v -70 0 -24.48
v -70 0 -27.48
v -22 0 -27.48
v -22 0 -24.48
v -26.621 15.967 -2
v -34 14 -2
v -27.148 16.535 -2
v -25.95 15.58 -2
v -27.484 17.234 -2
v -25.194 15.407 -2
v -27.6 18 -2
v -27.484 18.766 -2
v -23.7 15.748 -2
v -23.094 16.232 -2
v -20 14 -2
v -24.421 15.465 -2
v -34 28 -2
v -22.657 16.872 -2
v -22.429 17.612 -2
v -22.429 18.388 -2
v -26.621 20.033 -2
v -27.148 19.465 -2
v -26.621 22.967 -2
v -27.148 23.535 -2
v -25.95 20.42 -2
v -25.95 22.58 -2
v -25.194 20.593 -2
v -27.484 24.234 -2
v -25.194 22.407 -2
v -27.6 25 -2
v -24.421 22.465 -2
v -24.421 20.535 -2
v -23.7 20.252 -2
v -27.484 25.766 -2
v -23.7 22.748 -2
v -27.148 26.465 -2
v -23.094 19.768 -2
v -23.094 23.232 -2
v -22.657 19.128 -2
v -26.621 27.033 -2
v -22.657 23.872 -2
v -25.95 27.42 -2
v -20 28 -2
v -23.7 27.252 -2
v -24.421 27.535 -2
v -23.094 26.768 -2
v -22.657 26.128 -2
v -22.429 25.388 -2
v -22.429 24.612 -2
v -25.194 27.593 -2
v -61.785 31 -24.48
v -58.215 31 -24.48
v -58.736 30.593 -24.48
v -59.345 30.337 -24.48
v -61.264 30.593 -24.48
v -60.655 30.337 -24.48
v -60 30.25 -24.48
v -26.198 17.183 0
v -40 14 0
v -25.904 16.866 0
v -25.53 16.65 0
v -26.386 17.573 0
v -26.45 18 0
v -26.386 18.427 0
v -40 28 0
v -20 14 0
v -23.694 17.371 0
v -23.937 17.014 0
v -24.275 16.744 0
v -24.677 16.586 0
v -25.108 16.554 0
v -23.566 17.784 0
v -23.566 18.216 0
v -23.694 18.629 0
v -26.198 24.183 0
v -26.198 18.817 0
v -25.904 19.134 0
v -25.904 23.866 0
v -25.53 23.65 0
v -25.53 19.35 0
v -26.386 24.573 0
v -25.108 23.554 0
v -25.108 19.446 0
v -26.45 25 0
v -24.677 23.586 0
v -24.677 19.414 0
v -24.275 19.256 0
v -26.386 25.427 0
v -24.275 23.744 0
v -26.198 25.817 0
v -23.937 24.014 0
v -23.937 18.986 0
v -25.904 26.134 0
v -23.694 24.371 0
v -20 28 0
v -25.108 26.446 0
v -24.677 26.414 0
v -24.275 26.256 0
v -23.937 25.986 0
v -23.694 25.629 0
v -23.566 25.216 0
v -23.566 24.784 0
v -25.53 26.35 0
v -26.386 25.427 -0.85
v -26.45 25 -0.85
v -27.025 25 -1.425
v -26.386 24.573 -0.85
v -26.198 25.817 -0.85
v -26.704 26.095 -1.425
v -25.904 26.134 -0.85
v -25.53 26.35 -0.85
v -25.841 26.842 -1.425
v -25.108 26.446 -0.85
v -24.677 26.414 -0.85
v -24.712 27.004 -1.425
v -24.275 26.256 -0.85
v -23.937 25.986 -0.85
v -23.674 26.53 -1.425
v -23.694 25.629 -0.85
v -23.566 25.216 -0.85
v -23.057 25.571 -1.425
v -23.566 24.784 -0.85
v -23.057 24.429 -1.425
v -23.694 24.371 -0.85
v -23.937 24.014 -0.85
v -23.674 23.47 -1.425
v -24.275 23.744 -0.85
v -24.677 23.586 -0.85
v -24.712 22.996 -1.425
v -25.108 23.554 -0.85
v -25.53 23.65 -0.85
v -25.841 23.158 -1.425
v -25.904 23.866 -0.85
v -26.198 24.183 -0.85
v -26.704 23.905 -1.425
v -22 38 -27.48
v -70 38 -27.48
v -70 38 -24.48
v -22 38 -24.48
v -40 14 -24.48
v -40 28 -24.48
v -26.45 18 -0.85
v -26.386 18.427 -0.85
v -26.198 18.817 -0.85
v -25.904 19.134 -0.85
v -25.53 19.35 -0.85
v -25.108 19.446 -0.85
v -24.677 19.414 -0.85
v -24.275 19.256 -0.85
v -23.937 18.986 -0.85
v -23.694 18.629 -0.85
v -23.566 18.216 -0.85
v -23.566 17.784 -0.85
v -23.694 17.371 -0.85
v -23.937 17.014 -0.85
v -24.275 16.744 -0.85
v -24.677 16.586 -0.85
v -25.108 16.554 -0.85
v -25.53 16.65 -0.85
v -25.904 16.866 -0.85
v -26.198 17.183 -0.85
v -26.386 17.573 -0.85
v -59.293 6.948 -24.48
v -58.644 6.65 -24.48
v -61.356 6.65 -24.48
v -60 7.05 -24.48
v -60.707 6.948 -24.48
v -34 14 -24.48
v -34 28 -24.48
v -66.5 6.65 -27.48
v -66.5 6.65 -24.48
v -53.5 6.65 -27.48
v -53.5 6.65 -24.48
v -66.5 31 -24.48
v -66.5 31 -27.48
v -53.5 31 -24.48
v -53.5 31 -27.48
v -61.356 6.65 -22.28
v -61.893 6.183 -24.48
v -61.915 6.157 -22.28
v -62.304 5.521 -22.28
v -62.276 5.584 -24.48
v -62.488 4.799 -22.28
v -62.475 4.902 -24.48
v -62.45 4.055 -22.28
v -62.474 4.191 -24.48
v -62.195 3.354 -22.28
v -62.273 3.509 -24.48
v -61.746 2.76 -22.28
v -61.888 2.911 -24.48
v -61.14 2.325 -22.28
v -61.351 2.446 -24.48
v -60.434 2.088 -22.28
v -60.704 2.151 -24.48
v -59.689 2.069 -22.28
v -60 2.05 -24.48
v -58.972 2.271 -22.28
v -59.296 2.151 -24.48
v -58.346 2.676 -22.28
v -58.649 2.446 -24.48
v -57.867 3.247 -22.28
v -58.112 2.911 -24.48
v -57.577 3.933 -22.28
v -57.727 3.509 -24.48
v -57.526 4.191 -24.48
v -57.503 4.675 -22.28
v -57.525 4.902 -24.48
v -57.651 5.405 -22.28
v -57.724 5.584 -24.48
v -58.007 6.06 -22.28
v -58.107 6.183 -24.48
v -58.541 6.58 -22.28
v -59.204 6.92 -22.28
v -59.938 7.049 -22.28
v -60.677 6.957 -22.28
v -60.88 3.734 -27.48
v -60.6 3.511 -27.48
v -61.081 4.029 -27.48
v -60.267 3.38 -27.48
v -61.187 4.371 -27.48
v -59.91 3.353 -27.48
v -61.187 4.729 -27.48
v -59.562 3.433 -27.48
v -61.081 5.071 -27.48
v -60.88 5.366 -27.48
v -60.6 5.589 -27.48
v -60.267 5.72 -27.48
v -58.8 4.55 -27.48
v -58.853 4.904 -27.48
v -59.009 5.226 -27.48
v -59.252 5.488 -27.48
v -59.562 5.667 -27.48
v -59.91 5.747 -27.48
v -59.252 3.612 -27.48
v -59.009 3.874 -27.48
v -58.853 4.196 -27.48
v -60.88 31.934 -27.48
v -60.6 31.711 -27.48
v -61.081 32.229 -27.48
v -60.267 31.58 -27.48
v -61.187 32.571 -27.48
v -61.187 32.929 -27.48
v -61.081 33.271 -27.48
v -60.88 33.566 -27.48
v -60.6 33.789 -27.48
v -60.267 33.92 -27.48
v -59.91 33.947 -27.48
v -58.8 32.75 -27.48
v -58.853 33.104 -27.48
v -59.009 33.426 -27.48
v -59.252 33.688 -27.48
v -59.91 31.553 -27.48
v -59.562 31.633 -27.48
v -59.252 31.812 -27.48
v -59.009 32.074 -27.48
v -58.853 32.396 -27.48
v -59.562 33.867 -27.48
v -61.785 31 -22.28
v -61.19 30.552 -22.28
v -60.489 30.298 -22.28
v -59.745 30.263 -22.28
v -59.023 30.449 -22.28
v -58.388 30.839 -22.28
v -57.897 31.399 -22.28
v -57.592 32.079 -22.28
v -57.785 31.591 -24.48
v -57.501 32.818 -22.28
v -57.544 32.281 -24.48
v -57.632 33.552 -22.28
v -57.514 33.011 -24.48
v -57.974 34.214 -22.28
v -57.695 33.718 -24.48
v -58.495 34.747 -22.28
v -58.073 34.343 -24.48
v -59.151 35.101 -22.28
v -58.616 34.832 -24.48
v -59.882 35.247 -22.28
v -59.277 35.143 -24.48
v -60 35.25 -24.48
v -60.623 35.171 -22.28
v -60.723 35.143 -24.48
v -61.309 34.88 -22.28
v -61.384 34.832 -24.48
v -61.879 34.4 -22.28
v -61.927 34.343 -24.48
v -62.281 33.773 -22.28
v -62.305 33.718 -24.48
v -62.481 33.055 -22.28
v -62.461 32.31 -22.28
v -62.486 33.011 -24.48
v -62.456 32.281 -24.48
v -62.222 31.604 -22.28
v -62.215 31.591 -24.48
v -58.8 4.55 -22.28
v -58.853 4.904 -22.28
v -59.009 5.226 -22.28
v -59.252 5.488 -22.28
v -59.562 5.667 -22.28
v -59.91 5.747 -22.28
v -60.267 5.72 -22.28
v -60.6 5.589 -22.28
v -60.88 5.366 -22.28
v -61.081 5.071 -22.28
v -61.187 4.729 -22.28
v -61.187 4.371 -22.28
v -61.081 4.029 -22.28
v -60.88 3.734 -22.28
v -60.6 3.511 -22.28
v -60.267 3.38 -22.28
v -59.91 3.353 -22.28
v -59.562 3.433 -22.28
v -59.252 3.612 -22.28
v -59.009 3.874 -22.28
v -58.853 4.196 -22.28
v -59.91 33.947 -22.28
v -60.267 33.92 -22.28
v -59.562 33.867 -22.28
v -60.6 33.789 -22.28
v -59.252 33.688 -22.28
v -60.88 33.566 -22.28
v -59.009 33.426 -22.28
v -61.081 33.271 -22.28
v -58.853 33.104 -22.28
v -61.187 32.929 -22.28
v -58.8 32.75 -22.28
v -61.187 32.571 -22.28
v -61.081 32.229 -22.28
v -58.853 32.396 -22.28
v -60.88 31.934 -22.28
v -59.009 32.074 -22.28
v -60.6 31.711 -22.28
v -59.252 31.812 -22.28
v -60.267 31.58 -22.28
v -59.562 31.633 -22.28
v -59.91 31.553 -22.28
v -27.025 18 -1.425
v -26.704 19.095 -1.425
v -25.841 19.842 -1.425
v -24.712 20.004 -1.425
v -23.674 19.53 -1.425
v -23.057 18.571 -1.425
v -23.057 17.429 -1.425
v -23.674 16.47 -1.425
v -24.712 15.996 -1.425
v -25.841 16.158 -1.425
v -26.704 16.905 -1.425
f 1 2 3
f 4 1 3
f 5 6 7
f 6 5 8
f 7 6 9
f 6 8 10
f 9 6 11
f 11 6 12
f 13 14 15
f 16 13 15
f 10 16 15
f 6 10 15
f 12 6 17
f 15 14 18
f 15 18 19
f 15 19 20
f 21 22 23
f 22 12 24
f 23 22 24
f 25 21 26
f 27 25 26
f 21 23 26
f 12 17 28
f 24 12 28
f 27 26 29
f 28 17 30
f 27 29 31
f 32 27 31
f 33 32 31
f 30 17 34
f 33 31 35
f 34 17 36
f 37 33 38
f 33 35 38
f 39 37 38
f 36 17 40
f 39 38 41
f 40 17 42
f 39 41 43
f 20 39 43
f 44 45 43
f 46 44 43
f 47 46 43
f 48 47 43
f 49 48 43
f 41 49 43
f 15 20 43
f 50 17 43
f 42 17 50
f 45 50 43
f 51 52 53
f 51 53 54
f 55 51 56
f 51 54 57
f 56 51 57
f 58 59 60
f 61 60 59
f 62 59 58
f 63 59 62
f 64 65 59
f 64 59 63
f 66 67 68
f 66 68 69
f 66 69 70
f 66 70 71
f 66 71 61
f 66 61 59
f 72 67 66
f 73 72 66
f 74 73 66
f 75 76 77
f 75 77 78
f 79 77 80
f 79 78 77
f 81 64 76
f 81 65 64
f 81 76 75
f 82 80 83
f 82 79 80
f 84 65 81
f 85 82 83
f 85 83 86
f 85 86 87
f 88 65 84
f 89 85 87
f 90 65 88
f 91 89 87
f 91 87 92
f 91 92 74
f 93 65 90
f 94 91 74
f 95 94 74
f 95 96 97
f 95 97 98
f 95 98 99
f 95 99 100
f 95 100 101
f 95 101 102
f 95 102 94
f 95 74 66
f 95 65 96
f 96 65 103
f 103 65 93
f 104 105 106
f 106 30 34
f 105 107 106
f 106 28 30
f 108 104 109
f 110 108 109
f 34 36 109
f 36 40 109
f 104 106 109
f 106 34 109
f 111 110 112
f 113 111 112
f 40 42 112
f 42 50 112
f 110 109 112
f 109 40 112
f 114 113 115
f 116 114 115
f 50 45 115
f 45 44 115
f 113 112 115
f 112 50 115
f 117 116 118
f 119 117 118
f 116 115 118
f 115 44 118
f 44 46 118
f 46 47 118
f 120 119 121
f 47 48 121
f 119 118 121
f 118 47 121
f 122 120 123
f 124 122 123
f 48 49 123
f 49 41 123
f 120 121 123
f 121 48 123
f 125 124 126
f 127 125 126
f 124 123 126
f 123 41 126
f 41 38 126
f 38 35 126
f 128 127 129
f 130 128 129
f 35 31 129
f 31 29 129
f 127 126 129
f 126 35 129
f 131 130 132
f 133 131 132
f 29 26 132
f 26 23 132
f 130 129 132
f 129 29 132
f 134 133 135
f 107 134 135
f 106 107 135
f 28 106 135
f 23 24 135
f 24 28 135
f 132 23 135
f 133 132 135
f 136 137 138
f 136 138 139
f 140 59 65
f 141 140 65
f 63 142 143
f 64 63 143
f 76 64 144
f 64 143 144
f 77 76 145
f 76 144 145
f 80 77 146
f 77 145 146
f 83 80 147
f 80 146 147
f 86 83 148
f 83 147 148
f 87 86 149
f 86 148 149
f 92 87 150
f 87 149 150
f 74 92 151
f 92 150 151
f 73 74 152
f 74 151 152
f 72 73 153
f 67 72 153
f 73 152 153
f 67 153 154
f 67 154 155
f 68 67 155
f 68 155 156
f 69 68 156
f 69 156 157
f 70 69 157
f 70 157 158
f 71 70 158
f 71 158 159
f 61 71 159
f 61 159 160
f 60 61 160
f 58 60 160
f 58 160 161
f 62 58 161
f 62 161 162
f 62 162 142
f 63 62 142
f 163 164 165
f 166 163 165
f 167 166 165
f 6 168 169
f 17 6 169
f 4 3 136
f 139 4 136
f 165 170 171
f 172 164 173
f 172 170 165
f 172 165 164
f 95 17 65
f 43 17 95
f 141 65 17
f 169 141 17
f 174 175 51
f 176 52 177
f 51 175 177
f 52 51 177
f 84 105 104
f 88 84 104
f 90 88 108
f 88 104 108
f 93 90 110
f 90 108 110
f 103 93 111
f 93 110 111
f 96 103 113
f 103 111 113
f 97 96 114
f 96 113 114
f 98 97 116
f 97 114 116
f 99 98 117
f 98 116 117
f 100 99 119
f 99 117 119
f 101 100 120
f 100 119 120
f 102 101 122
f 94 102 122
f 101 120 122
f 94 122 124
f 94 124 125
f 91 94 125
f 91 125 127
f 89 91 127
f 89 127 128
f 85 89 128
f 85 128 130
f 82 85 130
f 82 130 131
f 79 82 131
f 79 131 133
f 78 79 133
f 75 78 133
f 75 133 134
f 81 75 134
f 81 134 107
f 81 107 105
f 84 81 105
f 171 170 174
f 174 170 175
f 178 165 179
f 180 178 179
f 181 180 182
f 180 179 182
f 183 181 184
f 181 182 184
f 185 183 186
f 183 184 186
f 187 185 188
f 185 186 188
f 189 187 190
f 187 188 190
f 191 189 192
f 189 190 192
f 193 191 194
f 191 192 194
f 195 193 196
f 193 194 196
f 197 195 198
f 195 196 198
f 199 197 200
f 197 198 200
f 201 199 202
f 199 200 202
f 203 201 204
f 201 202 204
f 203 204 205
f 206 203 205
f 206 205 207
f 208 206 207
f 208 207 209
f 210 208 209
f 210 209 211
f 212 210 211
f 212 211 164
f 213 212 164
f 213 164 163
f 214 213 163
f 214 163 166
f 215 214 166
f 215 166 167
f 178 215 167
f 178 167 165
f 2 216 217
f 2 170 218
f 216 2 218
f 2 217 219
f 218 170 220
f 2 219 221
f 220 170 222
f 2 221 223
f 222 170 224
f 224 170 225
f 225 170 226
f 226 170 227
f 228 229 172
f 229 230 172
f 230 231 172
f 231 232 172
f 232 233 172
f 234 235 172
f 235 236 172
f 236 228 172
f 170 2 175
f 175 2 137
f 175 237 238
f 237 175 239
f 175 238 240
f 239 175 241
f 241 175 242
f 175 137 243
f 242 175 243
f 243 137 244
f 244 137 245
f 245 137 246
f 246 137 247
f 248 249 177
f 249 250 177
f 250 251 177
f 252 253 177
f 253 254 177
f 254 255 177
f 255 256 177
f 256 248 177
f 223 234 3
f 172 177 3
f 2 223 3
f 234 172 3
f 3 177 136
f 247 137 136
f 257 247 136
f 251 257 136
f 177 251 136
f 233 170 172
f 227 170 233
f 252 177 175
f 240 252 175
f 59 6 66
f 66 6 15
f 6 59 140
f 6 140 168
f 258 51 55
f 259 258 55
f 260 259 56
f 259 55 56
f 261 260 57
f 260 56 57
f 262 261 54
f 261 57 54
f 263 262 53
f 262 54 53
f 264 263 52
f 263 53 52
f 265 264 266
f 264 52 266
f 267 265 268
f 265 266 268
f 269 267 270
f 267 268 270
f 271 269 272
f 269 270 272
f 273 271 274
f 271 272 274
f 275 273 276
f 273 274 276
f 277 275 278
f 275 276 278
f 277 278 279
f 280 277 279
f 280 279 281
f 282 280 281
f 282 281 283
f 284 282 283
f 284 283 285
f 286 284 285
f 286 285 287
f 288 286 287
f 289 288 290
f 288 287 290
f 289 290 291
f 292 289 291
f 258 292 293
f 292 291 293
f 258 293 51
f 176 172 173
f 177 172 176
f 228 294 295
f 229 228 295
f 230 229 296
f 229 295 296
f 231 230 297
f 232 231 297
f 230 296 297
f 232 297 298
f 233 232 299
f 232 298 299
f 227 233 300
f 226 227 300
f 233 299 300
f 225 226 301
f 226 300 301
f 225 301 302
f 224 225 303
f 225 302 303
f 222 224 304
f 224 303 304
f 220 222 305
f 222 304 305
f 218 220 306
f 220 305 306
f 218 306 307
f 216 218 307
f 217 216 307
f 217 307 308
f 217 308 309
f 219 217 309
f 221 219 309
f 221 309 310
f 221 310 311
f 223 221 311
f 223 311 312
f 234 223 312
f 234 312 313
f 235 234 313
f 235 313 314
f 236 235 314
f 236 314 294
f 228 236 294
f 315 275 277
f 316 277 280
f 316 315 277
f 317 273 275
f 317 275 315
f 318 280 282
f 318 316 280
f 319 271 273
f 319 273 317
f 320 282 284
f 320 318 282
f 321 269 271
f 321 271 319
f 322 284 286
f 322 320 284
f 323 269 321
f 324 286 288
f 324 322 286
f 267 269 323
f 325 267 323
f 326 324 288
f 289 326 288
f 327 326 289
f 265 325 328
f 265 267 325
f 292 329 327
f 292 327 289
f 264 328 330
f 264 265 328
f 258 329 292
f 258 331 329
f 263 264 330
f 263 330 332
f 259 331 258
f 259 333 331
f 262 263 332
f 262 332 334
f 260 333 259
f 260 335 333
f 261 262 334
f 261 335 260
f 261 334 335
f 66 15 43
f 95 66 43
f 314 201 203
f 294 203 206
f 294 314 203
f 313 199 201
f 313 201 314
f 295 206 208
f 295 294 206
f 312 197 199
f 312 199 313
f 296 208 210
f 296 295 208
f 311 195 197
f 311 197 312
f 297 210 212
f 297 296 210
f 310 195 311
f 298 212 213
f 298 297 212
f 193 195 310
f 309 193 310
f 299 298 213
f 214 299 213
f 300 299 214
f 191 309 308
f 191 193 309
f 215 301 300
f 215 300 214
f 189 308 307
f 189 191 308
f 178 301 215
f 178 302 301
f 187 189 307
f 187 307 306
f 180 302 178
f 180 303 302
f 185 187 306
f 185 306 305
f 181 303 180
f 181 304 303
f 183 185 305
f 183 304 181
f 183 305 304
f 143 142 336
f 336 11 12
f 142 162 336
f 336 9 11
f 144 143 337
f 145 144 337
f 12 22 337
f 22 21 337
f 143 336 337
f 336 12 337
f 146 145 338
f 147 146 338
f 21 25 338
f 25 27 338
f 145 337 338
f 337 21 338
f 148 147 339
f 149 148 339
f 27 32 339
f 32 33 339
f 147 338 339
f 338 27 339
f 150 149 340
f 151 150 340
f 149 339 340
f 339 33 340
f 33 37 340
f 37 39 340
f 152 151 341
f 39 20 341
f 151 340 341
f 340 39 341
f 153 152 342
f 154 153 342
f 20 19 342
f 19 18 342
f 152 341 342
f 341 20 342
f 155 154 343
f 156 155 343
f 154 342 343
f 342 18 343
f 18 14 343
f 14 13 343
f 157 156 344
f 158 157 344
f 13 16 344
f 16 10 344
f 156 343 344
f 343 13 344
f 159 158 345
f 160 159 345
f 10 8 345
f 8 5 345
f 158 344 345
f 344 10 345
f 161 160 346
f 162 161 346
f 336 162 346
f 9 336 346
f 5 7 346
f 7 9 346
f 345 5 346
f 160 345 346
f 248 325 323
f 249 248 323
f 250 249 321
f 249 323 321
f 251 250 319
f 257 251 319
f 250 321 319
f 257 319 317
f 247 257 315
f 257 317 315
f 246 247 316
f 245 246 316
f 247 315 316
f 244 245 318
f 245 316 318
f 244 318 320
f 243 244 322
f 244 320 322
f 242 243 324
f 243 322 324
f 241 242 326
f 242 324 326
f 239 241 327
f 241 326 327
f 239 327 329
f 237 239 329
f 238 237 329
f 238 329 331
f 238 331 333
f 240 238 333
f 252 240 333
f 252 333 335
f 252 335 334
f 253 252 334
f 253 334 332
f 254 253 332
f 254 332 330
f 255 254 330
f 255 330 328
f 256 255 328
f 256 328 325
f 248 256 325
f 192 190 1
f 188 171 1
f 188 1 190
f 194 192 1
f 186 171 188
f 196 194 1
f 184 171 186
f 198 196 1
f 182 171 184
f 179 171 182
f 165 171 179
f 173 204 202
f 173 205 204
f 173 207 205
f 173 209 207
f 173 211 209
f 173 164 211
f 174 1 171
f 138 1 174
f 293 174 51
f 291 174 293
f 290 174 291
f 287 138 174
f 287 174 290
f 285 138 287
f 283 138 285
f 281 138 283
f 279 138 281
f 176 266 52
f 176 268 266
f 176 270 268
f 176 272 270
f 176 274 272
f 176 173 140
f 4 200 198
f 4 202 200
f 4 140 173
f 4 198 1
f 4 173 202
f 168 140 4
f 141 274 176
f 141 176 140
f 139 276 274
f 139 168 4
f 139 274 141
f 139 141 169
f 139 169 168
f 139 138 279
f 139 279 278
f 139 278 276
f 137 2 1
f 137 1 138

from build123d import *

# Parameters (mm, degrees)
SERVO_SHELF_START                        = -27.480025
SKETCH1_W                                = 48
SKETCH1_H                                = 38
SKETCH1_W_2                              = 13
SKETCH1_H_2                              = 24.35
SERVO_SHELF_DEPTH                        = 3
OUTBOARD_RISER_START                     = -25.480025
SKETCH2_W                                = 6
SKETCH2_H                                = 14
OUTBOARD_RISER_DEPTH                     = 24.480025
PLATE_ATTACHMENT_FOOT_START              = -2
SKETCH3_W                                = 20
SKETCH3_H                                = 14
PLATE_ATTACHMENT_FOOT_DEPTH              = 2
SKETCH4_R                                = 1.45
SERVO_PAD_D2P9_DEPTH                     = 2.01
SKETCH5_R                                = 2.6
SERVO_PAD_CSK_D5P2_90DEG_DEPTH           = 1.15
SERVO_PAD_CSK_D5P2_90DEG_DRAFT           = -45
SERVO_PAD_CSK_D5P2_90DEG_PROFILE_2_DEPTH = 1.15
SERVO_PAD_CSK_D5P2_90DEG_PROFILE_2_DRAFT = -45
SERVO_EAR_SUPPORTS_H2P2_START            = -24.480025
SKETCH6_R                                = 2.5
SERVO_EAR_SUPPORTS_H2P2_DEPTH            = 2.2
SKETCH7_R                                = 1.2
SERVO_EAR_D2P4_THROUGH_DEPTH             = 5.21


with BuildPart() as part:
    # Sketch1 → Servo_Shelf (new body)
    with BuildSketch(Plane.XY.offset(SERVO_SHELF_START)):
        with Locations((-46, 19)):
            Rectangle(SKETCH1_W, SKETCH1_H)
        with Locations((-60, 18.825)):
            Rectangle(SKETCH1_W_2, SKETCH1_H_2, mode=Mode.SUBTRACT)
    extrude(amount=SERVO_SHELF_DEPTH)

    # Sketch2 → Outboard_Riser (add)
    with BuildSketch(Plane.XY.offset(OUTBOARD_RISER_START)):
        with Locations((-37, 21)):
            Rectangle(SKETCH2_W, SKETCH2_H)
    extrude(amount=OUTBOARD_RISER_DEPTH)

    # Sketch3 → Plate_Attachment_Foot (add)
    with BuildSketch(Plane.XY.offset(PLATE_ATTACHMENT_FOOT_START)):
        with Locations((-30, 21)):
            Rectangle(SKETCH3_W, SKETCH3_H)
    extrude(amount=PLATE_ATTACHMENT_FOOT_DEPTH)

    # Sketch4 → Servo_Pad_D2p9 (cut)
    with BuildSketch(Plane(origin=(0, 0, -2), x_dir=(-1, 0, 0), z_dir=(0, 0, -1))):
        with Locations((25, 18)):
            Circle(SKETCH4_R)
        with Locations((25, 25)):
            Circle(SKETCH4_R)
    extrude(amount=-SERVO_PAD_D2P9_DEPTH, mode=Mode.SUBTRACT)


with BuildPart() as servo_pad_csk_d5p2_90deg_tool:
    # Sketch5 → Servo_Pad_CSK_D5p2_90deg (with draft: the straight prism first)
    with BuildSketch(Plane(origin=(0, 0, -2), x_dir=(-1, 0, 0), z_dir=(0, 0, -1))):
        with Locations((25, 18)):
            Circle(SKETCH5_R)
    extrude(amount=-SERVO_PAD_CSK_D5P2_90DEG_DEPTH)
    # Servo_Pad_CSK_D5p2_90deg: the draft: its side faces are tilted about the plane it starts from
    servo_pad_csk_d5p2_90deg_sides = [servo_pad_csk_d5p2_90deg_tool.faces().sort_by_distance(p)[0] for p in [
        (-22.4, 18, -1.425),
    ]]
    draft(servo_pad_csk_d5p2_90deg_sides, Plane(origin=(0, 0, -2), x_dir=(-1, 0, 0), z_dir=(0, 0, -1)), SERVO_PAD_CSK_D5P2_90DEG_DRAFT)


with BuildPart() as part_1:
    add(part.part)

    # Servo_Pad_CSK_D5p2_90deg: cut by servo_pad_csk_d5p2_90deg_tool
    add(servo_pad_csk_d5p2_90deg_tool.part, mode=Mode.SUBTRACT)


with BuildPart() as servo_pad_csk_d5p2_90deg_profile_2_tool:
    # Sketch5 → Servo_Pad_CSK_D5p2_90deg profile 2 (with draft: the straight prism first)
    with BuildSketch(Plane(origin=(0, 0, -2), x_dir=(-1, 0, 0), z_dir=(0, 0, -1))):
        with Locations((25, 25)):
            Circle(SKETCH5_R)
    extrude(amount=-SERVO_PAD_CSK_D5P2_90DEG_PROFILE_2_DEPTH)
    # Servo_Pad_CSK_D5p2_90deg profile 2: the draft: its side faces are tilted about the plane it starts from
    servo_pad_csk_d5p2_90deg_profile_2_sides = [servo_pad_csk_d5p2_90deg_profile_2_tool.faces().sort_by_distance(p)[0] for p in [
        (-22.4, 25, -1.425),
    ]]
    draft(servo_pad_csk_d5p2_90deg_profile_2_sides, Plane(origin=(0, 0, -2), x_dir=(-1, 0, 0), z_dir=(0, 0, -1)), SERVO_PAD_CSK_D5P2_90DEG_PROFILE_2_DRAFT)


with BuildPart() as part_2:
    add(part_1.part)

    # Servo_Pad_CSK_D5p2_90deg profile 2: cut by servo_pad_csk_d5p2_90deg_profile_2_tool
    add(servo_pad_csk_d5p2_90deg_profile_2_tool.part, mode=Mode.SUBTRACT)

    # Sketch6 → Servo_Ear_Supports_H2p2 (add)
    with BuildSketch(Plane.XY.offset(SERVO_EAR_SUPPORTS_H2P2_START)):
        with Locations((-60, 4.55)):
            Circle(SKETCH6_R)
        with Locations((-60, 32.75)):
            Circle(SKETCH6_R)
    extrude(amount=SERVO_EAR_SUPPORTS_H2P2_DEPTH)

    # Sketch7 → Servo_Ear_D2p4_Through (cut)
    with BuildSketch(Plane.XY.offset(-22.280025)):
        with Locations((-60, 4.55)):
            Circle(SKETCH7_R)
        with Locations((-60, 32.75)):
            Circle(SKETCH7_R)
    extrude(amount=-SERVO_EAR_D2P4_THROUGH_DEPTH, mode=Mode.SUBTRACT)


solid = part_2.part
